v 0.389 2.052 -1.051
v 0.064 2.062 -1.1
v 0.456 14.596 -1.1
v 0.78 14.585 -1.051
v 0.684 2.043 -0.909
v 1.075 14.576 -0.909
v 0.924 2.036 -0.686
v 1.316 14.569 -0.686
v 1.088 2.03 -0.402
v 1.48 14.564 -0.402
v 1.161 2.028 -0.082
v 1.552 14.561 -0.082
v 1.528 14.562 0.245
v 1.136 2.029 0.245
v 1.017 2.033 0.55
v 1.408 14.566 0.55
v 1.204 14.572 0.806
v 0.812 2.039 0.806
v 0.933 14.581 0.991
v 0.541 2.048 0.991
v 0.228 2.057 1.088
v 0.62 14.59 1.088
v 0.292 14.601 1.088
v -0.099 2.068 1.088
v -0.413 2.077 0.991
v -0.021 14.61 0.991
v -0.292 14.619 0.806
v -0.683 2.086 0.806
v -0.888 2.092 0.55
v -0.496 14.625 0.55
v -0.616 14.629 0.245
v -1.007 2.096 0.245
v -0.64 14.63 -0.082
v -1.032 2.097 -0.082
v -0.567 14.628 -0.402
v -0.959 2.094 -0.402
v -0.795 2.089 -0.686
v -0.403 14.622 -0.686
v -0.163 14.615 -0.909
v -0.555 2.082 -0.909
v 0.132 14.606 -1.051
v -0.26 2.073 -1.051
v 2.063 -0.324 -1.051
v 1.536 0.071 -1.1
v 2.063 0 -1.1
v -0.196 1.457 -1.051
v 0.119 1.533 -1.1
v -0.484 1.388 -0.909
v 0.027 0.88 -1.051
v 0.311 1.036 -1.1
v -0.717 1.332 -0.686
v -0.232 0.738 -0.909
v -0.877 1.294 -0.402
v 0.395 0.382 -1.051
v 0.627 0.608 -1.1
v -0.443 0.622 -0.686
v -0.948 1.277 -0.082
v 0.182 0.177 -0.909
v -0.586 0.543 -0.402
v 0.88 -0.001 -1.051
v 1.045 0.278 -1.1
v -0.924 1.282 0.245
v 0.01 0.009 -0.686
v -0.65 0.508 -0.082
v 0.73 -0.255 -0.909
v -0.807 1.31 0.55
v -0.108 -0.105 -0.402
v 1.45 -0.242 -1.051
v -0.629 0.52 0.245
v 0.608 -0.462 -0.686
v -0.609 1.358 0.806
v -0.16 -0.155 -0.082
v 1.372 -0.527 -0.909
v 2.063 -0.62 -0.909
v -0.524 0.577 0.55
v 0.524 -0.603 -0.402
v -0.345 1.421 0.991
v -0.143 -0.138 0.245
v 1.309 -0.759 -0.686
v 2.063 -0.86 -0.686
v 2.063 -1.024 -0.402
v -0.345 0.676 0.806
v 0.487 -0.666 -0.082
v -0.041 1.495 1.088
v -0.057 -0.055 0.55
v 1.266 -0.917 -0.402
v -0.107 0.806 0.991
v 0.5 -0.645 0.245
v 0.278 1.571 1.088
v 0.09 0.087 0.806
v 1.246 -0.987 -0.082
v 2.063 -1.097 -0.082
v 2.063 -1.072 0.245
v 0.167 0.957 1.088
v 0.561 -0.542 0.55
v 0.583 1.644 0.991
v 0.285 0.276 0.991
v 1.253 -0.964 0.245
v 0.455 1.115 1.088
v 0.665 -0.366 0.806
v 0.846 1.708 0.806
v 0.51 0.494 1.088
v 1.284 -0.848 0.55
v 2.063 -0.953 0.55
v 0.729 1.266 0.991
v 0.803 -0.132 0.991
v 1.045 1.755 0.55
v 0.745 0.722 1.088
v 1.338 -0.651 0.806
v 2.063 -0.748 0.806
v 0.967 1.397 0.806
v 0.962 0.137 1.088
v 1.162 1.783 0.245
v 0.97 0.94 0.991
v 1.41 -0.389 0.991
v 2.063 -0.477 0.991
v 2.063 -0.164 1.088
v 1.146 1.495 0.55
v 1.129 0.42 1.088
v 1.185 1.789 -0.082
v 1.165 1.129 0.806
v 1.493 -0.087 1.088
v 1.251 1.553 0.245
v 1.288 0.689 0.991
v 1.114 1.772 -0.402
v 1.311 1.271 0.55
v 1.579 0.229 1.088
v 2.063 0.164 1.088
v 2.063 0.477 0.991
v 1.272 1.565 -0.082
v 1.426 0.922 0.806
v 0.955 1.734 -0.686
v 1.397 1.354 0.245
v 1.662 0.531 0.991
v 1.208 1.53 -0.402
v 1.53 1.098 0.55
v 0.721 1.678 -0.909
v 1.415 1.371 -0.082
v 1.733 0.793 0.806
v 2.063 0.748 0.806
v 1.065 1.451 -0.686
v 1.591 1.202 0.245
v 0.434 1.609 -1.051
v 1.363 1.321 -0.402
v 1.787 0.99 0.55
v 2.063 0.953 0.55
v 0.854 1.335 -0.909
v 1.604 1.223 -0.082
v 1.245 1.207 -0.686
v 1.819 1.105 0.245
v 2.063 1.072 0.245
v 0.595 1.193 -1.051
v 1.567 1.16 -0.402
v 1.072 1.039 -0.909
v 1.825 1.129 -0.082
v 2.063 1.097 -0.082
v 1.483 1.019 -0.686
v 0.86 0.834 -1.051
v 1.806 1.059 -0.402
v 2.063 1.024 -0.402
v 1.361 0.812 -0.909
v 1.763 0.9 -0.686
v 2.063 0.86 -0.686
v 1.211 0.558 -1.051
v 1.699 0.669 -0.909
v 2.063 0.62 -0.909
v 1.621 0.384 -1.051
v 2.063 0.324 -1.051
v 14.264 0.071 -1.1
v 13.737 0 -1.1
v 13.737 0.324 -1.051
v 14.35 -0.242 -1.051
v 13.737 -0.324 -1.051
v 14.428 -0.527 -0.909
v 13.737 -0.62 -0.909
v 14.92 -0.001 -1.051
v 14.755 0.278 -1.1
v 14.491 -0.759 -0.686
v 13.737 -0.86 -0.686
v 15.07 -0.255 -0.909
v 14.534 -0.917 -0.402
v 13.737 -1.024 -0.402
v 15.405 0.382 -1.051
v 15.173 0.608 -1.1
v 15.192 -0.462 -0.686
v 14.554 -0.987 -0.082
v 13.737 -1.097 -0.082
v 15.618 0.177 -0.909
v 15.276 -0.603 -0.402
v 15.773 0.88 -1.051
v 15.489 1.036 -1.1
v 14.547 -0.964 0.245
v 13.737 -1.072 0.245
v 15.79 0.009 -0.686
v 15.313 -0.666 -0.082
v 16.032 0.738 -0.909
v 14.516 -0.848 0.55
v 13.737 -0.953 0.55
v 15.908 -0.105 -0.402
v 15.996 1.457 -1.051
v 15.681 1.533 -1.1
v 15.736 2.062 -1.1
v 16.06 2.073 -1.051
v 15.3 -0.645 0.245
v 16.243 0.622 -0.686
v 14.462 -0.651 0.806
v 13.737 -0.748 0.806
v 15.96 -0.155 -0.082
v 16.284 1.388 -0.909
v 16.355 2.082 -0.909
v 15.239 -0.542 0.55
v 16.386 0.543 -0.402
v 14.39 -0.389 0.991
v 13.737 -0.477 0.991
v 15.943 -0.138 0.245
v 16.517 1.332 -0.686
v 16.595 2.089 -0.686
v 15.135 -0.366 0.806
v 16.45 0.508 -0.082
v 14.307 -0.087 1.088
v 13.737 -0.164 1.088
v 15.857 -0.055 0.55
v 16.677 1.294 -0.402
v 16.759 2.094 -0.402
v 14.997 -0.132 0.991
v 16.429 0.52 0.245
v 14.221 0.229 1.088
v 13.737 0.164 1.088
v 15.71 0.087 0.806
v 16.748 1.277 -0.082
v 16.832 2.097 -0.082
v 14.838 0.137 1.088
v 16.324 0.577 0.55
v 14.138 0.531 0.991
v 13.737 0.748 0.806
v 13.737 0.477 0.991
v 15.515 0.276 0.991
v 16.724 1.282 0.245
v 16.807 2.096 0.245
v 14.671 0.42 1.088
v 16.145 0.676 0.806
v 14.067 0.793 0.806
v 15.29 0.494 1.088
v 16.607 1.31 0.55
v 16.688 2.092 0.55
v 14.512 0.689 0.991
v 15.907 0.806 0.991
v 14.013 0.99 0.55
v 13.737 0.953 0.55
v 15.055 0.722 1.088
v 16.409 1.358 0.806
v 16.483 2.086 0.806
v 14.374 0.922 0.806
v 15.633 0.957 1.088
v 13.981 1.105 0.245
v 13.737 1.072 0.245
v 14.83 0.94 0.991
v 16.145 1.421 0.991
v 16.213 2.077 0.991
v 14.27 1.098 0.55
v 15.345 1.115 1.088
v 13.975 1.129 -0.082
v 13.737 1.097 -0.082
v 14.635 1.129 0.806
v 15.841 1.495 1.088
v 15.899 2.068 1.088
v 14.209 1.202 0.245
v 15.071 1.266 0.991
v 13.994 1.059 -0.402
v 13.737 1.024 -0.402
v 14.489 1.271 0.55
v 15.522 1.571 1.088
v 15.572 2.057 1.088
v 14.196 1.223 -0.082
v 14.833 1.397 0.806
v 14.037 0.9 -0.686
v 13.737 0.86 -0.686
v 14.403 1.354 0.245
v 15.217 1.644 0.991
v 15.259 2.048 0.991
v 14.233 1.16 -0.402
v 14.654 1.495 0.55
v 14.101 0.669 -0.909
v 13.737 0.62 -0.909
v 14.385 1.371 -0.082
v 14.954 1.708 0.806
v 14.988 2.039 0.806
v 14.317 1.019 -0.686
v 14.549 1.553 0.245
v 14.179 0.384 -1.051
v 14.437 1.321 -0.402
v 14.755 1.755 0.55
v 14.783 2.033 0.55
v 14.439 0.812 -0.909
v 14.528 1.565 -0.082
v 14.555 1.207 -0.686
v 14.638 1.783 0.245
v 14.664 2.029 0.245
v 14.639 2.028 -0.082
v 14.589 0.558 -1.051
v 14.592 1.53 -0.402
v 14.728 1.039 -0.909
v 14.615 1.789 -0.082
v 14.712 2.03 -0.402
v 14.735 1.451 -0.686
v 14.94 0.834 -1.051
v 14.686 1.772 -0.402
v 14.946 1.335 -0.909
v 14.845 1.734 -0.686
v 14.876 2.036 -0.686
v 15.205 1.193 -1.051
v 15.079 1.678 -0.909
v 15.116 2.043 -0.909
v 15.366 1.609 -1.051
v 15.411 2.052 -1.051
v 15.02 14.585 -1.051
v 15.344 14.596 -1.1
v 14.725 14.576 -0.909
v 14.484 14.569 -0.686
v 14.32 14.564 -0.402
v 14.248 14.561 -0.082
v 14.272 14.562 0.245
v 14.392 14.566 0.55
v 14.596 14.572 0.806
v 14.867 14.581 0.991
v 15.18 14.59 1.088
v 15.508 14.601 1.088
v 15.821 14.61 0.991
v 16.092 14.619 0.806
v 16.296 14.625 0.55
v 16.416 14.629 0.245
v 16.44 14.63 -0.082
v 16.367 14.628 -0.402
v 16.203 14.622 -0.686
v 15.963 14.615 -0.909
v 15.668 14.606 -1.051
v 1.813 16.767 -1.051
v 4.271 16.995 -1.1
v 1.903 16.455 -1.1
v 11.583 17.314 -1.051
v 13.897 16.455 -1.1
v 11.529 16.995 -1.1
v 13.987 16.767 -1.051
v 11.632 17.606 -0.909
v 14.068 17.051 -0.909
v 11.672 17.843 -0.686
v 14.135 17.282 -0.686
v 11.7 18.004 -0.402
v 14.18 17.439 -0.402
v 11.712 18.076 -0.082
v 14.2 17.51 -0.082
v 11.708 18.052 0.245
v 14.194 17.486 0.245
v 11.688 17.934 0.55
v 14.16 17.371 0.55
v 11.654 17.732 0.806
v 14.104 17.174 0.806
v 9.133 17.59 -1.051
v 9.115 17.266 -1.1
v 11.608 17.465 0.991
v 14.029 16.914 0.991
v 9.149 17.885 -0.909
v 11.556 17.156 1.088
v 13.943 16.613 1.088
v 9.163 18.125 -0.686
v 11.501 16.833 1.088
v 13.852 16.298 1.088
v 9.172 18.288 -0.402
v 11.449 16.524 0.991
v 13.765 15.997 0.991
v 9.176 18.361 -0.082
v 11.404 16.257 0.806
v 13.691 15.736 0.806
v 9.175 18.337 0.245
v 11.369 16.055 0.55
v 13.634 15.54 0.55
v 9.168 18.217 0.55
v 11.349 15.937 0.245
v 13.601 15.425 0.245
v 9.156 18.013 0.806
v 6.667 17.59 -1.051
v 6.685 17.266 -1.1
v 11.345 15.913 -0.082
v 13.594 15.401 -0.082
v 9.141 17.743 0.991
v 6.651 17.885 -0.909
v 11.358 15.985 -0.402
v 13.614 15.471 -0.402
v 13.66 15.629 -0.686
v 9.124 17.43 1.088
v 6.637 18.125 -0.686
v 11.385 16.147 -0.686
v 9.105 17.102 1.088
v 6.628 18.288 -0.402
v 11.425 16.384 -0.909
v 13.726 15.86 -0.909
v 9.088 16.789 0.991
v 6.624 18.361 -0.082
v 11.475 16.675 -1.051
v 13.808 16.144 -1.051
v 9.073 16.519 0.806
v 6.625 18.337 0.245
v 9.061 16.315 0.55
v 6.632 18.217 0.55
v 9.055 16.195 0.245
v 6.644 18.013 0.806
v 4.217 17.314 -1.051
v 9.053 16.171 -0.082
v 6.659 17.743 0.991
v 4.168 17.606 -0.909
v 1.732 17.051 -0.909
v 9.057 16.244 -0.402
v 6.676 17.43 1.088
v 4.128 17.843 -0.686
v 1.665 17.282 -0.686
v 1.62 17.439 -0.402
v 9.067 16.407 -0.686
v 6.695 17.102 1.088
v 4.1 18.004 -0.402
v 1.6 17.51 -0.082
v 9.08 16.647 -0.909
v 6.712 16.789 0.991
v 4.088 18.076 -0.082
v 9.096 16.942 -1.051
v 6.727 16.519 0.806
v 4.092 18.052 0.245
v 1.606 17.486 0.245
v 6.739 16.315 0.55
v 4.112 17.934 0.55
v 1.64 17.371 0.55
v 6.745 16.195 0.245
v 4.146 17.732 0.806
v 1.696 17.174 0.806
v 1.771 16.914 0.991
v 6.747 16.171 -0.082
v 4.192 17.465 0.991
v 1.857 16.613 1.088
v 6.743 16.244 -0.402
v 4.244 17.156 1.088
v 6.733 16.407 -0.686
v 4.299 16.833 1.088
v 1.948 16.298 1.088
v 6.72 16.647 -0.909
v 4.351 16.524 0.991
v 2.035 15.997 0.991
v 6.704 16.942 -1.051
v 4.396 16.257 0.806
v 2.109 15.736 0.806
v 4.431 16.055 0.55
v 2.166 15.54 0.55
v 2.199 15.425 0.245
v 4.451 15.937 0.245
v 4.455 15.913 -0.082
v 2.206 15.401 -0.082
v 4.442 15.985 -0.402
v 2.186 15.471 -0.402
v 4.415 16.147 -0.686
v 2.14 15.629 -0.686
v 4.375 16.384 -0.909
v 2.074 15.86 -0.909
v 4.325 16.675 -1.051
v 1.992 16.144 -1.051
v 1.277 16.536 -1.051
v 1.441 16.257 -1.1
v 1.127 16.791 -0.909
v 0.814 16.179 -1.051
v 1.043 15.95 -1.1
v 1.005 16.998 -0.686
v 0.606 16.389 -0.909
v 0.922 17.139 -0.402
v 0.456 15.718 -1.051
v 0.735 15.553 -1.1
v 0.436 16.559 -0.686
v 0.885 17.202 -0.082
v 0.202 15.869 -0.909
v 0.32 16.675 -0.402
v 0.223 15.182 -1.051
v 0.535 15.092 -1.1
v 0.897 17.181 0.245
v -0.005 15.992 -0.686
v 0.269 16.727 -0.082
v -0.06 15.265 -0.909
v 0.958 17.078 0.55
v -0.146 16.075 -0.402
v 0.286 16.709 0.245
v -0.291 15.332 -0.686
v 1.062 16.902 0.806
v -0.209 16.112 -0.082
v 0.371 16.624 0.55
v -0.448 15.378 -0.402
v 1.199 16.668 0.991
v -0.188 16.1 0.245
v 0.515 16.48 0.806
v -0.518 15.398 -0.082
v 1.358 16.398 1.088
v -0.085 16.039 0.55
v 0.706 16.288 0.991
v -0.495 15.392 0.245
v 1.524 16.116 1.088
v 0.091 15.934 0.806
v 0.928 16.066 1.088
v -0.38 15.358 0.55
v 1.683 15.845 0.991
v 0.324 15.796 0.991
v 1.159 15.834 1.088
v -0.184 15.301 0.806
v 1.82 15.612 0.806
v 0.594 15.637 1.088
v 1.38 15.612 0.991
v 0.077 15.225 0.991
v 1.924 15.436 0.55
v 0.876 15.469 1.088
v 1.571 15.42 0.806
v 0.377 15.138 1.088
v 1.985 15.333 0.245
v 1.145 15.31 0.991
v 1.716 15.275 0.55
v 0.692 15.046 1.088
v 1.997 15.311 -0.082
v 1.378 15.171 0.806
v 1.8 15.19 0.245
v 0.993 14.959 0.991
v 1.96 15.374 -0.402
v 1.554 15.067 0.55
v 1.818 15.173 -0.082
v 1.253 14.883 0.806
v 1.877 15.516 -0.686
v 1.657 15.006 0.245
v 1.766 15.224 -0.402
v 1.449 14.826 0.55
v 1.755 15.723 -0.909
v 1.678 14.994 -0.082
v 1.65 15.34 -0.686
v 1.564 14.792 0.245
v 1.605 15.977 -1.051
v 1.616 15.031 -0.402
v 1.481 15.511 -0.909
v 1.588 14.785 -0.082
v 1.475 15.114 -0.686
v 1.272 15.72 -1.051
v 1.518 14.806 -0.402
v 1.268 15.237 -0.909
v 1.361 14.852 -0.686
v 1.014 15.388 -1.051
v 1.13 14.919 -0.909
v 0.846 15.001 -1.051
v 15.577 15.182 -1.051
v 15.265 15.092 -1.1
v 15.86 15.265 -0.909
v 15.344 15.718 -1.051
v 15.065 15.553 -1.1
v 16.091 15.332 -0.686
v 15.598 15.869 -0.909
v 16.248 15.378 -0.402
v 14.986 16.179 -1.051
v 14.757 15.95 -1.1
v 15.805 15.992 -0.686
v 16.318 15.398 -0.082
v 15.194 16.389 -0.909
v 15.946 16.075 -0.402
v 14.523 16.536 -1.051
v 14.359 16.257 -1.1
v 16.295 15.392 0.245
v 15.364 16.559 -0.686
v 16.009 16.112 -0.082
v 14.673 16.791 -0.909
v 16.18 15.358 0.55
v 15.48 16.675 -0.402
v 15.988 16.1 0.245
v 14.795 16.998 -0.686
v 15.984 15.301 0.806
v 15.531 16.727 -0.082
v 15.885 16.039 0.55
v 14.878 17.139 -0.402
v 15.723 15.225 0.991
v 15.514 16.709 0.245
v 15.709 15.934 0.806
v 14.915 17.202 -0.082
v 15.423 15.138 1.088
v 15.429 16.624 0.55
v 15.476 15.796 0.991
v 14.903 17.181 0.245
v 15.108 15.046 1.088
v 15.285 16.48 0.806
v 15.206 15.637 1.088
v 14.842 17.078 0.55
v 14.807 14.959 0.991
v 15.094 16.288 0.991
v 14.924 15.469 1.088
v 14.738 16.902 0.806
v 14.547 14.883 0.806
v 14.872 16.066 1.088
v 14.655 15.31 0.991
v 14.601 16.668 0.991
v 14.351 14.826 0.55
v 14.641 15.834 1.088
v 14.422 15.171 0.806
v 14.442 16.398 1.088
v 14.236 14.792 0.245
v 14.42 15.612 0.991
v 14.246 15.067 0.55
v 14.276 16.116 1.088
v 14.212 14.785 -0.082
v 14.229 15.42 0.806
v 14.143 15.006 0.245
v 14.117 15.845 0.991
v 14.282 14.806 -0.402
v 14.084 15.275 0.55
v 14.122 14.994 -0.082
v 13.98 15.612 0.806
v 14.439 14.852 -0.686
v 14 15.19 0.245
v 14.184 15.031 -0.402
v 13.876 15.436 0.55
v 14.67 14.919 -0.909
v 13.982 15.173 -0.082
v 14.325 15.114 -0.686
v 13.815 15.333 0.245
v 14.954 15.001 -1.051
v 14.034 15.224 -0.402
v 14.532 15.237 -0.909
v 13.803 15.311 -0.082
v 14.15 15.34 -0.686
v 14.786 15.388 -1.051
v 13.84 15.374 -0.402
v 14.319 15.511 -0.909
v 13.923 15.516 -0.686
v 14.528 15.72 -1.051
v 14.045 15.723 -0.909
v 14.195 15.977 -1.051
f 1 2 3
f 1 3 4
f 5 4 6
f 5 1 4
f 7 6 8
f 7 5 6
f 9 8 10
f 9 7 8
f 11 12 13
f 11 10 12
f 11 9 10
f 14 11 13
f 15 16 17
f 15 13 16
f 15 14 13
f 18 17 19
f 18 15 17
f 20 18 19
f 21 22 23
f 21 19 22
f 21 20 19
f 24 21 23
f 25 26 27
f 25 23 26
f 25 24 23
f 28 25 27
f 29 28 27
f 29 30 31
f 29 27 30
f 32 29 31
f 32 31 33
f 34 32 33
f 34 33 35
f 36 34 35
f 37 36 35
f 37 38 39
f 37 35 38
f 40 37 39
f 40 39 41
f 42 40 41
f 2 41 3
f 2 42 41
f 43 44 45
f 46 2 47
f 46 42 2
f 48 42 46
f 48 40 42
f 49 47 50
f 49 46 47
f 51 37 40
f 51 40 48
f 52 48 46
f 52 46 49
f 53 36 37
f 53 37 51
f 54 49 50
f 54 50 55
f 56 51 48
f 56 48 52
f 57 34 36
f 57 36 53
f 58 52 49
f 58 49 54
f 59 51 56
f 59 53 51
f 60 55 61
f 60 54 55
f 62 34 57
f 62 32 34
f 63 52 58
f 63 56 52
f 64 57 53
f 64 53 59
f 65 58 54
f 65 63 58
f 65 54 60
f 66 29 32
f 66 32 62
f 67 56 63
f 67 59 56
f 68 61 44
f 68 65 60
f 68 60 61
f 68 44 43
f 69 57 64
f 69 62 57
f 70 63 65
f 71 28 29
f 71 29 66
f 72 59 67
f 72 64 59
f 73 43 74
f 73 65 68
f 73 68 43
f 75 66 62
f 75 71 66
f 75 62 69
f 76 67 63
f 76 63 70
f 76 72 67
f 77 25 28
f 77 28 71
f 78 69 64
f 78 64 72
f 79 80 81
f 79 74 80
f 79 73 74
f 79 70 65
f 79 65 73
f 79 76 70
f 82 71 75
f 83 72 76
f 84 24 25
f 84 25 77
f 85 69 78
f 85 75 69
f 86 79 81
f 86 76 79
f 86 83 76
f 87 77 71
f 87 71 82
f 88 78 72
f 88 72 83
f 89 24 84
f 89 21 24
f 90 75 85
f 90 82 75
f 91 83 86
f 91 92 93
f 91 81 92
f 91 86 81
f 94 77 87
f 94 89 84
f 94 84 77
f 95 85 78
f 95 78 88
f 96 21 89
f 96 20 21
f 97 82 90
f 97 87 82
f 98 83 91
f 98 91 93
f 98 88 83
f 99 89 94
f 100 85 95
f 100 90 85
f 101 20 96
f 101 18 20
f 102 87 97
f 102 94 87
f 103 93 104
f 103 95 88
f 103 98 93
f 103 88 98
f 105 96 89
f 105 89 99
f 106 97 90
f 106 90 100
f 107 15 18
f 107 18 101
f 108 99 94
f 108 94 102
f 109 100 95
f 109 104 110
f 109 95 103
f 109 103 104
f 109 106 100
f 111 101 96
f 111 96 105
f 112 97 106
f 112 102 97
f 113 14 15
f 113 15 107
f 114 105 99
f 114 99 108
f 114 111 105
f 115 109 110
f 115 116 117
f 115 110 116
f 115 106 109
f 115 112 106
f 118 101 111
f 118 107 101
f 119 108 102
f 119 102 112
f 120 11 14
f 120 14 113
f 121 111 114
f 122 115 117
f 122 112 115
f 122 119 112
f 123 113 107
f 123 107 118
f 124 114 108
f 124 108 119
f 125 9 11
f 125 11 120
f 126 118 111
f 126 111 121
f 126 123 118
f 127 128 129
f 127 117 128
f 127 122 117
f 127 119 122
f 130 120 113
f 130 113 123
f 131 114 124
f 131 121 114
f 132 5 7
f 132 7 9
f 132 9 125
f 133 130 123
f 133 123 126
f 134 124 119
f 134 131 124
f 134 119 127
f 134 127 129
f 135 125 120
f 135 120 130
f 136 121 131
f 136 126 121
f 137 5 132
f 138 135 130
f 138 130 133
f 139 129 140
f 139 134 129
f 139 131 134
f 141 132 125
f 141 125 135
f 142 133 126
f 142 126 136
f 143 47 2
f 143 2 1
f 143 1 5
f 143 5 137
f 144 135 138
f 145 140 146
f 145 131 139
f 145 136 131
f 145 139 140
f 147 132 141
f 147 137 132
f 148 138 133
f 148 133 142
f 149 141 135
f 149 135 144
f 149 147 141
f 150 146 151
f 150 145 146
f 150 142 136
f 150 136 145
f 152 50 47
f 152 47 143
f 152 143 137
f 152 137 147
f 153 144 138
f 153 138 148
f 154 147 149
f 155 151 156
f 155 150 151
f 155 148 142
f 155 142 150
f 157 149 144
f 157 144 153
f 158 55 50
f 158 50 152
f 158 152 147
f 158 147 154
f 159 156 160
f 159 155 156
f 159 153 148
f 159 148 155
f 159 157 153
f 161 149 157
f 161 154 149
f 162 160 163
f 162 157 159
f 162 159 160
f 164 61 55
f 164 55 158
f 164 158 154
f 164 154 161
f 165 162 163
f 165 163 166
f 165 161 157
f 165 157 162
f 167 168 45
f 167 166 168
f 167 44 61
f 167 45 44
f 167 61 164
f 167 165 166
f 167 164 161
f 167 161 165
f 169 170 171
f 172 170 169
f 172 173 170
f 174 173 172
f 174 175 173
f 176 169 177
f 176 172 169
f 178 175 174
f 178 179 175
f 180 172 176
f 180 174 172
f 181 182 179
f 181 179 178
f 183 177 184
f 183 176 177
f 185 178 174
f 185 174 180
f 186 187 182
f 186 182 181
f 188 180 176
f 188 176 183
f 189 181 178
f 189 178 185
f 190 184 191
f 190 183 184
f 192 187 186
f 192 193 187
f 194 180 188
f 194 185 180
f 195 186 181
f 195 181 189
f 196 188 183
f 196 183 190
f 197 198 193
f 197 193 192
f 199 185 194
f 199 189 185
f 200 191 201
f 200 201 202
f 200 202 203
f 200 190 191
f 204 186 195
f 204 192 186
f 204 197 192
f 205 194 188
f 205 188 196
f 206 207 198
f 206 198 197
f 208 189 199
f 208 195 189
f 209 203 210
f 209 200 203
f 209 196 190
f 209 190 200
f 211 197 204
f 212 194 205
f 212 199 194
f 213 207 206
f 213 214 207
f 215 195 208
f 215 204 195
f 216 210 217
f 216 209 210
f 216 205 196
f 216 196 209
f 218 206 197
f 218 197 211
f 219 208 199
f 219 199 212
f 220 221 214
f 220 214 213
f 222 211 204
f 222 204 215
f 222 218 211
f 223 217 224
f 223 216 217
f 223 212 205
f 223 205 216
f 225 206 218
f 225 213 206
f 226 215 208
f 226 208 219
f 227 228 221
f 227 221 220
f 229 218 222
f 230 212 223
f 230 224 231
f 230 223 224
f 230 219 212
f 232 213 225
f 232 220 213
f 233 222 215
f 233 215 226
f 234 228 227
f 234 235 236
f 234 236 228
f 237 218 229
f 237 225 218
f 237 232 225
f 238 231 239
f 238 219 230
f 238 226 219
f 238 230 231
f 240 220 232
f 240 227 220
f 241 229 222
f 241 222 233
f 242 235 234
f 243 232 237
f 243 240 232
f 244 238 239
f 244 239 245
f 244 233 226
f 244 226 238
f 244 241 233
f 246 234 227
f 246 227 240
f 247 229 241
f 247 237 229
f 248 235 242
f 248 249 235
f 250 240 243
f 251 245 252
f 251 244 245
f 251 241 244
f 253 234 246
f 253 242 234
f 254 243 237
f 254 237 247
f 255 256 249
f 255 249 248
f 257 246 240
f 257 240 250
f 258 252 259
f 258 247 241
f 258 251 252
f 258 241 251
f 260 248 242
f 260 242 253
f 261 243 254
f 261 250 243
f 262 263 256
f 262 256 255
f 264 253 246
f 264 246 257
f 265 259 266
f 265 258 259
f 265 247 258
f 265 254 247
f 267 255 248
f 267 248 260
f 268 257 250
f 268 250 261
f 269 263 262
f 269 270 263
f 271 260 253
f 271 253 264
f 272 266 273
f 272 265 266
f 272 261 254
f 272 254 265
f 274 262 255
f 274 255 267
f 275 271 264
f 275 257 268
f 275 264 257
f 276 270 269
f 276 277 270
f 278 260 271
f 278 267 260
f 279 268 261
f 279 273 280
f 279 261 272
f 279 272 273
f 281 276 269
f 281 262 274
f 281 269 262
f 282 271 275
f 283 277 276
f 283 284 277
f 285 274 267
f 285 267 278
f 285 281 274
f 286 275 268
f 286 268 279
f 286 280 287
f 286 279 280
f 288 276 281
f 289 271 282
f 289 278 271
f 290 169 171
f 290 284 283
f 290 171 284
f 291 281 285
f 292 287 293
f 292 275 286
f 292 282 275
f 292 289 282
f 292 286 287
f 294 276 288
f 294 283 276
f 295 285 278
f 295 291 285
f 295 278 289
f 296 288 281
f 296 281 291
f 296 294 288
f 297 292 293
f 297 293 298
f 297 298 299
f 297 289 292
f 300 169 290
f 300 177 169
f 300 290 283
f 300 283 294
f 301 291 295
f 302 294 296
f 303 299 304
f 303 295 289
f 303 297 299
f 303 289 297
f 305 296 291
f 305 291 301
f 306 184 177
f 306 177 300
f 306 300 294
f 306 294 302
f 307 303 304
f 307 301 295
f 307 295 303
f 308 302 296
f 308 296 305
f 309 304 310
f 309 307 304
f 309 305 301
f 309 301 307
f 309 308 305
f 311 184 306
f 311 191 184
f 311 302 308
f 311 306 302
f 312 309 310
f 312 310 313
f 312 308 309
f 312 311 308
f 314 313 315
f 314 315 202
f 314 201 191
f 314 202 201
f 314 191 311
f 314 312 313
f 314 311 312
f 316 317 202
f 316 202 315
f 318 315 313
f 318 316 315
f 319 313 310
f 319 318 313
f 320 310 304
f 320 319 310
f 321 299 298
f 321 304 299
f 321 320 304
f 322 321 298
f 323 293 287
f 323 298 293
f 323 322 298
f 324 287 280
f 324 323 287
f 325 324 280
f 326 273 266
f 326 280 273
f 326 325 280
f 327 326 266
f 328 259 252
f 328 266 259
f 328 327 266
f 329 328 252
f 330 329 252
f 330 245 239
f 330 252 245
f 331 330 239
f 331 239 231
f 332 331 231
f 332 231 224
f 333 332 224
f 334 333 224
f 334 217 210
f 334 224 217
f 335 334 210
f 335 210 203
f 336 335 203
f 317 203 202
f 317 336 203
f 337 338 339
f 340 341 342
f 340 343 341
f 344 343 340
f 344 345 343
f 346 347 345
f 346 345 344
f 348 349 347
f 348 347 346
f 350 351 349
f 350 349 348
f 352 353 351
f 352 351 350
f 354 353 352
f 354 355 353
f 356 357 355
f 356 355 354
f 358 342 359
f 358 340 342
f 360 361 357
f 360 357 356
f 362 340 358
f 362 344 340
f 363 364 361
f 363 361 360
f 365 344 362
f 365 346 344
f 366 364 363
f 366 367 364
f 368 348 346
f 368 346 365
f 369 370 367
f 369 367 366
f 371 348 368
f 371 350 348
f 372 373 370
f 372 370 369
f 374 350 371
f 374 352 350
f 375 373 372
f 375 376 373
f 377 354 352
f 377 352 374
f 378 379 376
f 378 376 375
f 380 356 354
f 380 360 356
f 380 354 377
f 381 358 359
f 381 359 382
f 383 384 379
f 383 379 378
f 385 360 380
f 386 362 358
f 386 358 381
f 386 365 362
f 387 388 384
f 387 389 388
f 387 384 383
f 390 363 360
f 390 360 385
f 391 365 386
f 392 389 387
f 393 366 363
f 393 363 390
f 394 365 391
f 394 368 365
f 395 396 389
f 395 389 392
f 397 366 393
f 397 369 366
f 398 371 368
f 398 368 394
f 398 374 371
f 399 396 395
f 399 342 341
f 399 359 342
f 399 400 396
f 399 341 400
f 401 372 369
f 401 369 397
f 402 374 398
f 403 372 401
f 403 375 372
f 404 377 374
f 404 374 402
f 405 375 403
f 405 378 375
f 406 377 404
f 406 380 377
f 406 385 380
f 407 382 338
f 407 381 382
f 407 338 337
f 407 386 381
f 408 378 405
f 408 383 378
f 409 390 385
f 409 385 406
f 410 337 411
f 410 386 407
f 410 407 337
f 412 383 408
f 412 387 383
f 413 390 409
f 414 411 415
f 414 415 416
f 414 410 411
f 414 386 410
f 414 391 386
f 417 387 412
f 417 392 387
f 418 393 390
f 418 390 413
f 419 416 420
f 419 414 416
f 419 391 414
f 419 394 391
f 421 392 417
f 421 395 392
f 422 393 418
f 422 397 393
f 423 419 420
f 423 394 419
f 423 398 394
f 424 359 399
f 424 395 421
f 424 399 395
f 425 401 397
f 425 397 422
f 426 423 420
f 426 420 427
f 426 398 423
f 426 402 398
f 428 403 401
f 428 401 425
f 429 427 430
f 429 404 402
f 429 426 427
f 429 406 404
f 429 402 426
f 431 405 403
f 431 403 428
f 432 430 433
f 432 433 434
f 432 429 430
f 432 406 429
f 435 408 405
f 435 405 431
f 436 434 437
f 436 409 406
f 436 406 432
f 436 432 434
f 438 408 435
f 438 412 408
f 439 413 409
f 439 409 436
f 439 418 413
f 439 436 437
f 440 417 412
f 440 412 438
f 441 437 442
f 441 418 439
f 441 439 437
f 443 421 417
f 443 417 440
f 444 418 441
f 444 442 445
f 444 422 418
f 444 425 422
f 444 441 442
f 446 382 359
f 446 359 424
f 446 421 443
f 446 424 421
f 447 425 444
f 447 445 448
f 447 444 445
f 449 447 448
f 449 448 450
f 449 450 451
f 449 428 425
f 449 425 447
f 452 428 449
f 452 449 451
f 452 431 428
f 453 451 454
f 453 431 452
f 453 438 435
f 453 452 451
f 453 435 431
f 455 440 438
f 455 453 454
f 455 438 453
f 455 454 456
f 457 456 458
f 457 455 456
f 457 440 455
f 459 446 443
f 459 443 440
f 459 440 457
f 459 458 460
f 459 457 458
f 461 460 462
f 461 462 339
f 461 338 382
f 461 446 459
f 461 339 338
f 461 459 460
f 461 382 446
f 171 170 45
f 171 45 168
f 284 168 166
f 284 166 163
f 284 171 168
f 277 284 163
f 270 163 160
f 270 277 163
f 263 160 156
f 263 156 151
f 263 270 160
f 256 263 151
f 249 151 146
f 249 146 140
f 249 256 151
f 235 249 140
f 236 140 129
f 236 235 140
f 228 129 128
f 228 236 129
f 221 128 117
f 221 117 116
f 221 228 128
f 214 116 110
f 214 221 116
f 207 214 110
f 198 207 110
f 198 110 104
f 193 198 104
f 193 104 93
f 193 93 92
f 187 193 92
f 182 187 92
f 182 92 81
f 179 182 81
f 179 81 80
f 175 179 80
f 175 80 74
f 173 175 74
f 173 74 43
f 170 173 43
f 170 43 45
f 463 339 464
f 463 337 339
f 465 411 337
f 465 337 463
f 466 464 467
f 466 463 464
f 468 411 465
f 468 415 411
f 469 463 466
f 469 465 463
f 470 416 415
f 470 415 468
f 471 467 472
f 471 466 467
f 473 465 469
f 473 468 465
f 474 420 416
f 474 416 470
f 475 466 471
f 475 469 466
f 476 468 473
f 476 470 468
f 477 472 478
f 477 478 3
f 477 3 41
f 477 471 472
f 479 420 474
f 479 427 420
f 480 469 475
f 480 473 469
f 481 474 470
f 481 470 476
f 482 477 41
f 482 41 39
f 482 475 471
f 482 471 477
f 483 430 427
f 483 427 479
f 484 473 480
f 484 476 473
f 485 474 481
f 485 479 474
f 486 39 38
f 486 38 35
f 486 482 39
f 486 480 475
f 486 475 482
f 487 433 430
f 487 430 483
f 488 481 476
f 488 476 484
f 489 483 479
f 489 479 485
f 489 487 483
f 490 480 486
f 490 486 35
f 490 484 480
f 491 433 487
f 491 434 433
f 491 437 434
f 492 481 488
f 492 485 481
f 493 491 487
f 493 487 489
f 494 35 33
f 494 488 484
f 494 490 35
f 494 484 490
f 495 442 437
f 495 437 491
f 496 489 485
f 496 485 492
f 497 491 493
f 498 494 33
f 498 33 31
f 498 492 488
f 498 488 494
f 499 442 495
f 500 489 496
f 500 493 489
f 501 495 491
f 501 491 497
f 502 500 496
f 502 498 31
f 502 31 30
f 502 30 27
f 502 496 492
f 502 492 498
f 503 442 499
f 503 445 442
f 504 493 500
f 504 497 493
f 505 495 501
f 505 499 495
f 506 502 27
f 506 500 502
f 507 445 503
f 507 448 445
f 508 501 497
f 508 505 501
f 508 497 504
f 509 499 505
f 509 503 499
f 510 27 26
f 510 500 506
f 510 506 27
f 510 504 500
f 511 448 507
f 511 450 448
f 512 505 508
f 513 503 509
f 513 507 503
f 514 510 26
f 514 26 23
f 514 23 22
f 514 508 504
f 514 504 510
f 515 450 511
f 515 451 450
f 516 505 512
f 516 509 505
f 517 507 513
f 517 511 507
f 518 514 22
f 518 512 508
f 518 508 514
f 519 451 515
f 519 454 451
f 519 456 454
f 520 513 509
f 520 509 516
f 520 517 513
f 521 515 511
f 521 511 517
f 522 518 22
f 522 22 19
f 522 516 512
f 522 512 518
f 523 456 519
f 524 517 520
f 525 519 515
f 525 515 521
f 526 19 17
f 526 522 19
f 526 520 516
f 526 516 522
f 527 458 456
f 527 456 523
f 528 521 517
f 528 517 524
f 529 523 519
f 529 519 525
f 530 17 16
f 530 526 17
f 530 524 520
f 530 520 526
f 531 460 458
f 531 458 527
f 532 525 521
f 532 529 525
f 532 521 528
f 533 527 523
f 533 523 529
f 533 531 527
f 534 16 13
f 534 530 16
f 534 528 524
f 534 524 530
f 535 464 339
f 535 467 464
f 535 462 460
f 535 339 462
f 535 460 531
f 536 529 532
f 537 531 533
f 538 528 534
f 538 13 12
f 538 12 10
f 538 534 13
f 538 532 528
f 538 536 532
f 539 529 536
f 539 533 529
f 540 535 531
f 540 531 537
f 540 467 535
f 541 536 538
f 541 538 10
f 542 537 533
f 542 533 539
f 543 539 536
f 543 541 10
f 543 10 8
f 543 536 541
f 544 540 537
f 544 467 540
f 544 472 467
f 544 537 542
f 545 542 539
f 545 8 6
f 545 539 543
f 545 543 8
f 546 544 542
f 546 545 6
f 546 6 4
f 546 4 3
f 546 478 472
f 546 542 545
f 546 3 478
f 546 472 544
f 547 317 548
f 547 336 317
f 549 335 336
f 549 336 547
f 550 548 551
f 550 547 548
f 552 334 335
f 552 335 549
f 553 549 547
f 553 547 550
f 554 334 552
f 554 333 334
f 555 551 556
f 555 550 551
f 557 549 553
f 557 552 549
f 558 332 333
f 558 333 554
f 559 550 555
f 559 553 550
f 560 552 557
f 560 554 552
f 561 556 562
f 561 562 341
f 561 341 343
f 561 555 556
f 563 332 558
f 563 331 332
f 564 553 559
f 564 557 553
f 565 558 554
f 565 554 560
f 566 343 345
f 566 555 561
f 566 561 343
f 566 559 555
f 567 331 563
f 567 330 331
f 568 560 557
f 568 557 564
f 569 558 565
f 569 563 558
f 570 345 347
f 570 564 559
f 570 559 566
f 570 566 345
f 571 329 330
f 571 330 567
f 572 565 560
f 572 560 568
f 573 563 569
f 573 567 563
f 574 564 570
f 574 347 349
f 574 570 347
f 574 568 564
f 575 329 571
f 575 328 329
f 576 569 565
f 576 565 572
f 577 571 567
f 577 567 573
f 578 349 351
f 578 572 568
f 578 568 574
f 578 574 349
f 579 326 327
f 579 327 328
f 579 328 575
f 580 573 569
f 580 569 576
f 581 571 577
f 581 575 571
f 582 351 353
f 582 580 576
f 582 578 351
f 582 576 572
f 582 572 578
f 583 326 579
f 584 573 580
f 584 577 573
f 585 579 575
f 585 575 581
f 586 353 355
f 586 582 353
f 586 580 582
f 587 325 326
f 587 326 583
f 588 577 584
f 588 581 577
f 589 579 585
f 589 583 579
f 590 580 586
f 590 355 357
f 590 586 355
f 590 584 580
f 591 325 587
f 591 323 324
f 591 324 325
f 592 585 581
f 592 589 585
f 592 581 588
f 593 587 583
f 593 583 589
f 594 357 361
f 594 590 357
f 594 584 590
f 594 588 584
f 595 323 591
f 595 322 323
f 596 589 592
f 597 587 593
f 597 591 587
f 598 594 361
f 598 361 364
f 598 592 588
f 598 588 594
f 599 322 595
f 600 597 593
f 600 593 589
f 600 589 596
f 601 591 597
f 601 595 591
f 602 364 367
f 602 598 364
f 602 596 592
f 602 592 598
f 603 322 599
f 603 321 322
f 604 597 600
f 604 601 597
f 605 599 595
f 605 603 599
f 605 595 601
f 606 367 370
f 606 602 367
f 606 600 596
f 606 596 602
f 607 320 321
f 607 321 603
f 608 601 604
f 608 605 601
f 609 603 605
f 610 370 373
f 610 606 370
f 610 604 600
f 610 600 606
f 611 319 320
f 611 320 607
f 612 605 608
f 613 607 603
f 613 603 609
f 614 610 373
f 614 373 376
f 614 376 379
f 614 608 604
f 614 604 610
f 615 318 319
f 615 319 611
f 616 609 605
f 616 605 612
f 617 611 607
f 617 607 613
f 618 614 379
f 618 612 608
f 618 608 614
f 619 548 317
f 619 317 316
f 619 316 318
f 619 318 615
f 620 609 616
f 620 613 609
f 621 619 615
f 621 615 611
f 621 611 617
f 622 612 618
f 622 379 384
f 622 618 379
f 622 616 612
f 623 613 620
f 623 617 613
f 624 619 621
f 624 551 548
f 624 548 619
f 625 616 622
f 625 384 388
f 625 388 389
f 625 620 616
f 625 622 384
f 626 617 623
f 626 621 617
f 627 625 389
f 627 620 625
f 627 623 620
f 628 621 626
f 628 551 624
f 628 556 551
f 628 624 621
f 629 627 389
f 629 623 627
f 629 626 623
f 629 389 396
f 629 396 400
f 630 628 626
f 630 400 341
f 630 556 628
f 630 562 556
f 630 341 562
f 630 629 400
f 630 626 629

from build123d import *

# Parameters (mm, degrees)
SKETCH_3_R = 1.1


with BuildPart() as part:
    # 扫描1: sweep along a path in 草图1
    with BuildLine(Plane.XY) as sweep_1_path:
        Line((2.063476324, 0), (13.736523676, 0))
        ThreePointArc((13.736523676, 0), (15.17265372, 0.608047955), (15.735547828, 2.062469505))
        Line((15.735547828, 2.062469505), (15.343889389, 14.595539539))
        ThreePointArc((15.343889389, 14.595539539), (14.923518493, 15.761017061), (13.897319856, 16.455254701))
        ThreePointArc((13.897319856, 16.455254701), (7.9, 17.3), (1.902680144, 16.455254701))
        ThreePointArc((1.902680144, 16.455254701), (0.876481507, 15.761017061), (0.456110611, 14.595539539))
        Line((0.456110611, 14.595539539), (0.064452172, 2.062469505))
        ThreePointArc((0.064452172, 2.062469505), (0.62734628, 0.608047955), (2.063476324, 0))
    # 草图3 → 扫描1 (sweep)
    with BuildSketch(Plane(origin=(7.6, 0, 0), x_dir=(0, 0, -1), z_dir=(1, 0, 0))):
        Circle(SKETCH_3_R)
    sweep(path=sweep_1_path.line)


solid = part.part
